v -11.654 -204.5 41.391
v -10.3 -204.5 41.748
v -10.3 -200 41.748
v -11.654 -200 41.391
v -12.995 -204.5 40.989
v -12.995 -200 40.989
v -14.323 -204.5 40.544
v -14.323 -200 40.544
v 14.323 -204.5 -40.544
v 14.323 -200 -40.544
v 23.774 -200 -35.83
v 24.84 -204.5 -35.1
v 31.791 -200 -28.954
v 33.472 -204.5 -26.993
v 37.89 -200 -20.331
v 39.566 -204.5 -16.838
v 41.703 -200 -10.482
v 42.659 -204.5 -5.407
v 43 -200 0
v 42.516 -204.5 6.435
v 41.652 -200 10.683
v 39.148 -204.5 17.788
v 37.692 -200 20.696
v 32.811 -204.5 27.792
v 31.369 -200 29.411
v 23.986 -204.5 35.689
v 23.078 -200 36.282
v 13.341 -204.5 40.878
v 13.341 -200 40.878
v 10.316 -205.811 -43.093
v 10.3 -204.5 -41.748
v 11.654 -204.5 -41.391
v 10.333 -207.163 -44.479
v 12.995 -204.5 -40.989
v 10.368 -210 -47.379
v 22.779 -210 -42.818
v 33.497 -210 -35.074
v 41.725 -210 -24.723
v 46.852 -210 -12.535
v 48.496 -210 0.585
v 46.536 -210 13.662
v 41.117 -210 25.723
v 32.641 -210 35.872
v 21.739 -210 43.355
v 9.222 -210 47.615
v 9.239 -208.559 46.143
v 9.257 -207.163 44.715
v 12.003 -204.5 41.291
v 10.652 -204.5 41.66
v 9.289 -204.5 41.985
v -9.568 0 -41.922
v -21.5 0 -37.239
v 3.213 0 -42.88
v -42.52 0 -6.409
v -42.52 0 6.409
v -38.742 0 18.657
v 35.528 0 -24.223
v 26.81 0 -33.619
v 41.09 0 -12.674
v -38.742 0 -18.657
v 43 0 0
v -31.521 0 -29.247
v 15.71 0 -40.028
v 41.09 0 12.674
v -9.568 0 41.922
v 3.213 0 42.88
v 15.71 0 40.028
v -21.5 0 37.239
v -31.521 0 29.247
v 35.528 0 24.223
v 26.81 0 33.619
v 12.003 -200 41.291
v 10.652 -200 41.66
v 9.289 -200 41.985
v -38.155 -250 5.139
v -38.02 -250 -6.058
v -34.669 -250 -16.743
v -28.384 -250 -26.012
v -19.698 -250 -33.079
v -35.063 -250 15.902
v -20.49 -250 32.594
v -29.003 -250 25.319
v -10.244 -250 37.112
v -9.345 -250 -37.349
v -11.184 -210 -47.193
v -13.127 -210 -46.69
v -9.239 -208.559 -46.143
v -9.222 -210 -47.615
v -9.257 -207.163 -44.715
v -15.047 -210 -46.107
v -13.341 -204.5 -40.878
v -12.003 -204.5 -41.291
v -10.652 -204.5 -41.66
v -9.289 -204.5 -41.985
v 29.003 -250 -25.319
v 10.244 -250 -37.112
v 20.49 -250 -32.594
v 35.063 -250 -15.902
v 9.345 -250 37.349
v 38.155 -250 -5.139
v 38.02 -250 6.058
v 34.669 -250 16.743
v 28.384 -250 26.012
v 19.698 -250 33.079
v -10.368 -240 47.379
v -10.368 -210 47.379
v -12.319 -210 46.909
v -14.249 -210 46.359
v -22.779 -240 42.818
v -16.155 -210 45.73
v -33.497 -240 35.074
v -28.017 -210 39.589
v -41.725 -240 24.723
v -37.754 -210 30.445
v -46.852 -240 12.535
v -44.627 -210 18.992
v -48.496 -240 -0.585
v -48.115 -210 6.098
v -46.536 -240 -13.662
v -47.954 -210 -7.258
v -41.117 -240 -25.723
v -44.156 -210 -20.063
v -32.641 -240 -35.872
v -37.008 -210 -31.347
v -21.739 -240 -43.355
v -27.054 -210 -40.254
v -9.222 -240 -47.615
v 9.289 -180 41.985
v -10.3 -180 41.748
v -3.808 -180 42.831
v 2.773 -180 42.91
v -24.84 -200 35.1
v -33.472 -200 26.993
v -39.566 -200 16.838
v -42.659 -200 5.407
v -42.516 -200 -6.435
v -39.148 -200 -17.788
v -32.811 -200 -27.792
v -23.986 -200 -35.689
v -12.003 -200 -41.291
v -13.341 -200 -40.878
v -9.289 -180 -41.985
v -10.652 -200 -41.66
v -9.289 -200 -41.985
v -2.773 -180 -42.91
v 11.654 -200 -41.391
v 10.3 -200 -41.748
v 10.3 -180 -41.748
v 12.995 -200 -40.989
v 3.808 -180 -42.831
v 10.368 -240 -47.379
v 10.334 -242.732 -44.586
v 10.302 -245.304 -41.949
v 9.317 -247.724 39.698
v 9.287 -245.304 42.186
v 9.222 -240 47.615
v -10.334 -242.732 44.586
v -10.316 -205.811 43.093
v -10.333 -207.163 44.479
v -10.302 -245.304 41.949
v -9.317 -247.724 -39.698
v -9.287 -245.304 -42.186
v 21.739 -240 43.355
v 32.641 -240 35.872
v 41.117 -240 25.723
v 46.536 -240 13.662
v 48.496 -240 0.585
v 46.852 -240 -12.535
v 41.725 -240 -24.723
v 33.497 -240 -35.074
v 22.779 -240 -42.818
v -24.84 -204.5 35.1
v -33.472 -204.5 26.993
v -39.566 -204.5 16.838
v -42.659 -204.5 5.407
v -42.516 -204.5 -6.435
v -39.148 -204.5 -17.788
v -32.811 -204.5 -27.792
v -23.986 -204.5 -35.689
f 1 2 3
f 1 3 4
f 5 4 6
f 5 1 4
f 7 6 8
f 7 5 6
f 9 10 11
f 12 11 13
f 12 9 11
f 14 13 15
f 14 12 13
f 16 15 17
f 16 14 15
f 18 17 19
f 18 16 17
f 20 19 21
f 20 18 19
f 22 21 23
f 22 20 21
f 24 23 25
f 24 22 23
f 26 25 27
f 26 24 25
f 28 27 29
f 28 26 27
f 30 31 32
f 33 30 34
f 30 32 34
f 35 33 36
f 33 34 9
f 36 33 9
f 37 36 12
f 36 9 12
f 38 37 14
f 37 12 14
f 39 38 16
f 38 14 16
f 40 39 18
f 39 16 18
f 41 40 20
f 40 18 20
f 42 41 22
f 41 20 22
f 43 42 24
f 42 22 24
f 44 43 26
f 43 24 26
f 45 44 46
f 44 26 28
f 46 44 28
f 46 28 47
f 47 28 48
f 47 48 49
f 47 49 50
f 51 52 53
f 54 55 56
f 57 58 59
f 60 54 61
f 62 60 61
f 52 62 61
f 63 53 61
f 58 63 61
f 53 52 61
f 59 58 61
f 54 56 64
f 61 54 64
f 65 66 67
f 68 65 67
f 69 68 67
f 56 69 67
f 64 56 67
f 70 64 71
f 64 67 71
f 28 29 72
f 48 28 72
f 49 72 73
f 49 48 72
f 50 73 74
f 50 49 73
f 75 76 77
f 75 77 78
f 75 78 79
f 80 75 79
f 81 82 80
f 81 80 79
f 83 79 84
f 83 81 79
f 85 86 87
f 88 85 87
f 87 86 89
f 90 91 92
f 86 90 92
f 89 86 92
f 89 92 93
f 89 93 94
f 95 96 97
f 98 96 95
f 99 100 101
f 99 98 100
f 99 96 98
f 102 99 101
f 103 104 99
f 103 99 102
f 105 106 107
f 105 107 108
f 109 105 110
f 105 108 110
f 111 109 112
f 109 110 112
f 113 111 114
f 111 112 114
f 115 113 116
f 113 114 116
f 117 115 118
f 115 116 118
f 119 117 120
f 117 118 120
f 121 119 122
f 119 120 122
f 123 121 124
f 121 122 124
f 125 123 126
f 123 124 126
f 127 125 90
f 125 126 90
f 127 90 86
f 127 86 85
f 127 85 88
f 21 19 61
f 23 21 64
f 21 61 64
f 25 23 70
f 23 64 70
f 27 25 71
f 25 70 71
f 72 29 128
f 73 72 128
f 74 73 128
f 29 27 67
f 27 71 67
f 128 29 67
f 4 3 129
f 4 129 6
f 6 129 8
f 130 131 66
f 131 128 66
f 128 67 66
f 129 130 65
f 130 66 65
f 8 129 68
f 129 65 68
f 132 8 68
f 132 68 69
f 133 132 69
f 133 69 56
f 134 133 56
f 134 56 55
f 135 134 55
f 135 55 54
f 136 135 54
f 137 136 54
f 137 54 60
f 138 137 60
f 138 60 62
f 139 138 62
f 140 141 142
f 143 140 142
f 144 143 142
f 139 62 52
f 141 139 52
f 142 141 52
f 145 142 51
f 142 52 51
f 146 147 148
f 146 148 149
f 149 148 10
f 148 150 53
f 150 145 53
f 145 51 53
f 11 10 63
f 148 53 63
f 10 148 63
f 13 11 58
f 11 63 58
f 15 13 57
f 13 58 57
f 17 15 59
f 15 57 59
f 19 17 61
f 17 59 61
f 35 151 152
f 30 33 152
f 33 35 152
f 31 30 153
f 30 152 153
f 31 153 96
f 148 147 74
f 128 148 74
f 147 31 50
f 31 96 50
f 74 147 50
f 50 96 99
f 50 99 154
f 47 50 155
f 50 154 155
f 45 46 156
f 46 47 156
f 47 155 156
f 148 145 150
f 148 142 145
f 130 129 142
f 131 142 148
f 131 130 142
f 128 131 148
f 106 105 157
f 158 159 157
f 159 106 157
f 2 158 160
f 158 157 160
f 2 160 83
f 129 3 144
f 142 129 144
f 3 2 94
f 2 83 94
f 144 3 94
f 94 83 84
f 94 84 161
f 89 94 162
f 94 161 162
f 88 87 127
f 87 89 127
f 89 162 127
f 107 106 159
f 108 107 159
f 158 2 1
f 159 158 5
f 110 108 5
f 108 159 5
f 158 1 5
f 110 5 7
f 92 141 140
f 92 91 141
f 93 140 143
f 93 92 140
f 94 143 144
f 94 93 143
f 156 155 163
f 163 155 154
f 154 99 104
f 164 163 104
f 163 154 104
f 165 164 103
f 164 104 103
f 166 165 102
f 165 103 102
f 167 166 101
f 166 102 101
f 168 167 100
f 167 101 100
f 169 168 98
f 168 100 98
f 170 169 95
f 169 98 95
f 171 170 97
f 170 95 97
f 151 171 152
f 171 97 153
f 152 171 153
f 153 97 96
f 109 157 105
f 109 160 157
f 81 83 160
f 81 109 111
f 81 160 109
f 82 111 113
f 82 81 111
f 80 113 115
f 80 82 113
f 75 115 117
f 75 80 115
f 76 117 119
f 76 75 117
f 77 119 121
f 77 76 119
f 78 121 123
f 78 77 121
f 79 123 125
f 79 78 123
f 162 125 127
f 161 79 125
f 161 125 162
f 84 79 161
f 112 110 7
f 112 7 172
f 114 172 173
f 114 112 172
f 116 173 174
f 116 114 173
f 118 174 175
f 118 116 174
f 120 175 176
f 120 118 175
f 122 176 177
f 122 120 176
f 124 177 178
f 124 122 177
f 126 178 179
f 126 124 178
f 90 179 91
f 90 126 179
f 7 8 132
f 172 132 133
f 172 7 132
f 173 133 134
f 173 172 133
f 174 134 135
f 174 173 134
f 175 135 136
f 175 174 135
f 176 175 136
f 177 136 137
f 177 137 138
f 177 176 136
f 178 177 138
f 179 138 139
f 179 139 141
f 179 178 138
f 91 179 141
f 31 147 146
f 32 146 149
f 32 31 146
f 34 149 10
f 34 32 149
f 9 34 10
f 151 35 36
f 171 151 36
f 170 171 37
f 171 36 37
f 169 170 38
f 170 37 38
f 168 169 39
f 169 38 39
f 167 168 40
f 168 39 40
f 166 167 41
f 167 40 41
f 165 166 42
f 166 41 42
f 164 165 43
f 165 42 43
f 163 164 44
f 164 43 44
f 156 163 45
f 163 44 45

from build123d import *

# Parameters (mm, degrees)
F0_R         = 48.5
F0_R_2       = 43
F1_DEPTH     = 250
F2_DEPTH     = 200
F4_DEPTH     = 70
F5_T2_ANGLE  = 217.5315587112
F5_T4_ANGLE  = 217.5315587112
F5_T8_ANGLE  = 217.5315587112
F5_S9_R      = 43
F5_T10_DEPTH = 60
F5_T14_ANGLE = 217.5315587112
F5_S15_R     = 43
F5_T16_DEPTH = 60


# Not quite as in the source:
# - a fillet or chamfer that OpenCascade refuses, or shapes differently, is made with other operations: its cross-section is extruded or revolved along the edge and cut away or added


with BuildPart() as f1:
    # F0 (on Front) → F1 (new body)
    with BuildSketch(Plane.XZ):
        Circle(F0_R)
        Circle(F0_R_2, mode=Mode.SUBTRACT)
        Circle(F0_R_2)
    extrude(amount=F1_DEPTH)

    # F0 (on Front) → F2 (cut)
    with BuildSketch(Plane.XZ):
        Circle(F0_R)
        Circle(F0_R_2, mode=Mode.SUBTRACT)
    extrude(amount=F2_DEPTH, mode=Mode.SUBTRACT)

    # F3 (on face) → F4 (cut)
    with BuildSketch(Plane.XZ.offset(250)):
        with BuildLine():
            Line((10.3677597397, -47.3788935918), (9.2215594636, 47.6152584899))
            ThreePointArc((9.2215594636, 47.6152584899), (-0.5851588327, 48.4964698627), (-10.3677597397, 47.3788935918))
            Line((-10.3677597397, 47.3788935918), (-9.2215594636, -47.6152584899))
            ThreePointArc((-9.2215594636, -47.6152584899), (0.5851588327, -48.4964698627), (10.3677597397, -47.3788935918))
        make_face()
    extrude(amount=-F4_DEPTH, mode=Mode.SUBTRACT)

    # F5: chamfer of 10 on 4 edges, made by hand

    # F5_s1 → F5_t2 (revolve, cut)
    with BuildSketch(Plane(origin=(0, 0, 0), x_dir=(0, 1, 0), z_dir=(0.9506540069, 0, -0.3102530567))):
        Polygon((-240, 48.5), (-250, 38.5), (-250, 48.5), align=None)
    revolve(axis=Axis((0, -250, 0), (0, -1, 0)), revolution_arc=F5_T2_ANGLE, mode=Mode.SUBTRACT)

    # F5_s3 → F5_t4 (revolve, cut)
    with BuildSketch(Plane(origin=(0, 0, 0), x_dir=(0, 1, 0), z_dir=(-0.9428912961, 0, -0.3331005911))):
        Polygon((-240, -48.5), (-250, -38.5), (-250, -48.5), align=None)
    revolve(axis=Axis((0, -250, 0), (0, 1, 0)), revolution_arc=F5_T4_ANGLE, mode=Mode.SUBTRACT)


with BuildPart() as f5_tool6:
    # F5_s7 → F5_t8 (revolve)
    with BuildSketch(Plane(origin=(0, 0, 0), x_dir=(0, 1, 0), z_dir=(-0.9506540069, 0, 0.3102530567))):
        Polygon((-210, 48.5), (-200, 38.5), (-200, 48.5), align=None)
    revolve(axis=Axis((0, -200, 0), (0, -1, 0)), revolution_arc=F5_T8_ANGLE)

    # F5_s9 → F5_t10 (cut, symmetric)
    with BuildSketch(Plane.XZ.offset(205)):
        Circle(F5_S9_R)
    extrude(amount=F5_T10_DEPTH, both=True, mode=Mode.SUBTRACT)


with BuildPart() as f1_1:
    add(f1.part)

    # F5_t5: cut F5_tool6
    add(f5_tool6.part, mode=Mode.SUBTRACT)


with BuildPart() as f5_tool12:
    # F5_s13 → F5_t14 (revolve)
    with BuildSketch(Plane(origin=(0, 0, 0), x_dir=(0, 1, 0), z_dir=(0.9506540069, 0, -0.3102530567))):
        Polygon((-200, 38.5), (-210, 48.5), (-200, 48.5), align=None)
    revolve(axis=Axis((0, -200, 0), (0, -1, 0)), revolution_arc=F5_T14_ANGLE)

    # F5_s15 → F5_t16 (cut, symmetric)
    with BuildSketch(Plane.XZ.offset(205)):
        Circle(F5_S15_R)
    extrude(amount=F5_T16_DEPTH, both=True, mode=Mode.SUBTRACT)


with BuildPart() as f1_2:
    add(f1_1.part)

    # F5_t11: cut F5_tool12
    add(f5_tool12.part, mode=Mode.SUBTRACT)


solid = f1_2.part
